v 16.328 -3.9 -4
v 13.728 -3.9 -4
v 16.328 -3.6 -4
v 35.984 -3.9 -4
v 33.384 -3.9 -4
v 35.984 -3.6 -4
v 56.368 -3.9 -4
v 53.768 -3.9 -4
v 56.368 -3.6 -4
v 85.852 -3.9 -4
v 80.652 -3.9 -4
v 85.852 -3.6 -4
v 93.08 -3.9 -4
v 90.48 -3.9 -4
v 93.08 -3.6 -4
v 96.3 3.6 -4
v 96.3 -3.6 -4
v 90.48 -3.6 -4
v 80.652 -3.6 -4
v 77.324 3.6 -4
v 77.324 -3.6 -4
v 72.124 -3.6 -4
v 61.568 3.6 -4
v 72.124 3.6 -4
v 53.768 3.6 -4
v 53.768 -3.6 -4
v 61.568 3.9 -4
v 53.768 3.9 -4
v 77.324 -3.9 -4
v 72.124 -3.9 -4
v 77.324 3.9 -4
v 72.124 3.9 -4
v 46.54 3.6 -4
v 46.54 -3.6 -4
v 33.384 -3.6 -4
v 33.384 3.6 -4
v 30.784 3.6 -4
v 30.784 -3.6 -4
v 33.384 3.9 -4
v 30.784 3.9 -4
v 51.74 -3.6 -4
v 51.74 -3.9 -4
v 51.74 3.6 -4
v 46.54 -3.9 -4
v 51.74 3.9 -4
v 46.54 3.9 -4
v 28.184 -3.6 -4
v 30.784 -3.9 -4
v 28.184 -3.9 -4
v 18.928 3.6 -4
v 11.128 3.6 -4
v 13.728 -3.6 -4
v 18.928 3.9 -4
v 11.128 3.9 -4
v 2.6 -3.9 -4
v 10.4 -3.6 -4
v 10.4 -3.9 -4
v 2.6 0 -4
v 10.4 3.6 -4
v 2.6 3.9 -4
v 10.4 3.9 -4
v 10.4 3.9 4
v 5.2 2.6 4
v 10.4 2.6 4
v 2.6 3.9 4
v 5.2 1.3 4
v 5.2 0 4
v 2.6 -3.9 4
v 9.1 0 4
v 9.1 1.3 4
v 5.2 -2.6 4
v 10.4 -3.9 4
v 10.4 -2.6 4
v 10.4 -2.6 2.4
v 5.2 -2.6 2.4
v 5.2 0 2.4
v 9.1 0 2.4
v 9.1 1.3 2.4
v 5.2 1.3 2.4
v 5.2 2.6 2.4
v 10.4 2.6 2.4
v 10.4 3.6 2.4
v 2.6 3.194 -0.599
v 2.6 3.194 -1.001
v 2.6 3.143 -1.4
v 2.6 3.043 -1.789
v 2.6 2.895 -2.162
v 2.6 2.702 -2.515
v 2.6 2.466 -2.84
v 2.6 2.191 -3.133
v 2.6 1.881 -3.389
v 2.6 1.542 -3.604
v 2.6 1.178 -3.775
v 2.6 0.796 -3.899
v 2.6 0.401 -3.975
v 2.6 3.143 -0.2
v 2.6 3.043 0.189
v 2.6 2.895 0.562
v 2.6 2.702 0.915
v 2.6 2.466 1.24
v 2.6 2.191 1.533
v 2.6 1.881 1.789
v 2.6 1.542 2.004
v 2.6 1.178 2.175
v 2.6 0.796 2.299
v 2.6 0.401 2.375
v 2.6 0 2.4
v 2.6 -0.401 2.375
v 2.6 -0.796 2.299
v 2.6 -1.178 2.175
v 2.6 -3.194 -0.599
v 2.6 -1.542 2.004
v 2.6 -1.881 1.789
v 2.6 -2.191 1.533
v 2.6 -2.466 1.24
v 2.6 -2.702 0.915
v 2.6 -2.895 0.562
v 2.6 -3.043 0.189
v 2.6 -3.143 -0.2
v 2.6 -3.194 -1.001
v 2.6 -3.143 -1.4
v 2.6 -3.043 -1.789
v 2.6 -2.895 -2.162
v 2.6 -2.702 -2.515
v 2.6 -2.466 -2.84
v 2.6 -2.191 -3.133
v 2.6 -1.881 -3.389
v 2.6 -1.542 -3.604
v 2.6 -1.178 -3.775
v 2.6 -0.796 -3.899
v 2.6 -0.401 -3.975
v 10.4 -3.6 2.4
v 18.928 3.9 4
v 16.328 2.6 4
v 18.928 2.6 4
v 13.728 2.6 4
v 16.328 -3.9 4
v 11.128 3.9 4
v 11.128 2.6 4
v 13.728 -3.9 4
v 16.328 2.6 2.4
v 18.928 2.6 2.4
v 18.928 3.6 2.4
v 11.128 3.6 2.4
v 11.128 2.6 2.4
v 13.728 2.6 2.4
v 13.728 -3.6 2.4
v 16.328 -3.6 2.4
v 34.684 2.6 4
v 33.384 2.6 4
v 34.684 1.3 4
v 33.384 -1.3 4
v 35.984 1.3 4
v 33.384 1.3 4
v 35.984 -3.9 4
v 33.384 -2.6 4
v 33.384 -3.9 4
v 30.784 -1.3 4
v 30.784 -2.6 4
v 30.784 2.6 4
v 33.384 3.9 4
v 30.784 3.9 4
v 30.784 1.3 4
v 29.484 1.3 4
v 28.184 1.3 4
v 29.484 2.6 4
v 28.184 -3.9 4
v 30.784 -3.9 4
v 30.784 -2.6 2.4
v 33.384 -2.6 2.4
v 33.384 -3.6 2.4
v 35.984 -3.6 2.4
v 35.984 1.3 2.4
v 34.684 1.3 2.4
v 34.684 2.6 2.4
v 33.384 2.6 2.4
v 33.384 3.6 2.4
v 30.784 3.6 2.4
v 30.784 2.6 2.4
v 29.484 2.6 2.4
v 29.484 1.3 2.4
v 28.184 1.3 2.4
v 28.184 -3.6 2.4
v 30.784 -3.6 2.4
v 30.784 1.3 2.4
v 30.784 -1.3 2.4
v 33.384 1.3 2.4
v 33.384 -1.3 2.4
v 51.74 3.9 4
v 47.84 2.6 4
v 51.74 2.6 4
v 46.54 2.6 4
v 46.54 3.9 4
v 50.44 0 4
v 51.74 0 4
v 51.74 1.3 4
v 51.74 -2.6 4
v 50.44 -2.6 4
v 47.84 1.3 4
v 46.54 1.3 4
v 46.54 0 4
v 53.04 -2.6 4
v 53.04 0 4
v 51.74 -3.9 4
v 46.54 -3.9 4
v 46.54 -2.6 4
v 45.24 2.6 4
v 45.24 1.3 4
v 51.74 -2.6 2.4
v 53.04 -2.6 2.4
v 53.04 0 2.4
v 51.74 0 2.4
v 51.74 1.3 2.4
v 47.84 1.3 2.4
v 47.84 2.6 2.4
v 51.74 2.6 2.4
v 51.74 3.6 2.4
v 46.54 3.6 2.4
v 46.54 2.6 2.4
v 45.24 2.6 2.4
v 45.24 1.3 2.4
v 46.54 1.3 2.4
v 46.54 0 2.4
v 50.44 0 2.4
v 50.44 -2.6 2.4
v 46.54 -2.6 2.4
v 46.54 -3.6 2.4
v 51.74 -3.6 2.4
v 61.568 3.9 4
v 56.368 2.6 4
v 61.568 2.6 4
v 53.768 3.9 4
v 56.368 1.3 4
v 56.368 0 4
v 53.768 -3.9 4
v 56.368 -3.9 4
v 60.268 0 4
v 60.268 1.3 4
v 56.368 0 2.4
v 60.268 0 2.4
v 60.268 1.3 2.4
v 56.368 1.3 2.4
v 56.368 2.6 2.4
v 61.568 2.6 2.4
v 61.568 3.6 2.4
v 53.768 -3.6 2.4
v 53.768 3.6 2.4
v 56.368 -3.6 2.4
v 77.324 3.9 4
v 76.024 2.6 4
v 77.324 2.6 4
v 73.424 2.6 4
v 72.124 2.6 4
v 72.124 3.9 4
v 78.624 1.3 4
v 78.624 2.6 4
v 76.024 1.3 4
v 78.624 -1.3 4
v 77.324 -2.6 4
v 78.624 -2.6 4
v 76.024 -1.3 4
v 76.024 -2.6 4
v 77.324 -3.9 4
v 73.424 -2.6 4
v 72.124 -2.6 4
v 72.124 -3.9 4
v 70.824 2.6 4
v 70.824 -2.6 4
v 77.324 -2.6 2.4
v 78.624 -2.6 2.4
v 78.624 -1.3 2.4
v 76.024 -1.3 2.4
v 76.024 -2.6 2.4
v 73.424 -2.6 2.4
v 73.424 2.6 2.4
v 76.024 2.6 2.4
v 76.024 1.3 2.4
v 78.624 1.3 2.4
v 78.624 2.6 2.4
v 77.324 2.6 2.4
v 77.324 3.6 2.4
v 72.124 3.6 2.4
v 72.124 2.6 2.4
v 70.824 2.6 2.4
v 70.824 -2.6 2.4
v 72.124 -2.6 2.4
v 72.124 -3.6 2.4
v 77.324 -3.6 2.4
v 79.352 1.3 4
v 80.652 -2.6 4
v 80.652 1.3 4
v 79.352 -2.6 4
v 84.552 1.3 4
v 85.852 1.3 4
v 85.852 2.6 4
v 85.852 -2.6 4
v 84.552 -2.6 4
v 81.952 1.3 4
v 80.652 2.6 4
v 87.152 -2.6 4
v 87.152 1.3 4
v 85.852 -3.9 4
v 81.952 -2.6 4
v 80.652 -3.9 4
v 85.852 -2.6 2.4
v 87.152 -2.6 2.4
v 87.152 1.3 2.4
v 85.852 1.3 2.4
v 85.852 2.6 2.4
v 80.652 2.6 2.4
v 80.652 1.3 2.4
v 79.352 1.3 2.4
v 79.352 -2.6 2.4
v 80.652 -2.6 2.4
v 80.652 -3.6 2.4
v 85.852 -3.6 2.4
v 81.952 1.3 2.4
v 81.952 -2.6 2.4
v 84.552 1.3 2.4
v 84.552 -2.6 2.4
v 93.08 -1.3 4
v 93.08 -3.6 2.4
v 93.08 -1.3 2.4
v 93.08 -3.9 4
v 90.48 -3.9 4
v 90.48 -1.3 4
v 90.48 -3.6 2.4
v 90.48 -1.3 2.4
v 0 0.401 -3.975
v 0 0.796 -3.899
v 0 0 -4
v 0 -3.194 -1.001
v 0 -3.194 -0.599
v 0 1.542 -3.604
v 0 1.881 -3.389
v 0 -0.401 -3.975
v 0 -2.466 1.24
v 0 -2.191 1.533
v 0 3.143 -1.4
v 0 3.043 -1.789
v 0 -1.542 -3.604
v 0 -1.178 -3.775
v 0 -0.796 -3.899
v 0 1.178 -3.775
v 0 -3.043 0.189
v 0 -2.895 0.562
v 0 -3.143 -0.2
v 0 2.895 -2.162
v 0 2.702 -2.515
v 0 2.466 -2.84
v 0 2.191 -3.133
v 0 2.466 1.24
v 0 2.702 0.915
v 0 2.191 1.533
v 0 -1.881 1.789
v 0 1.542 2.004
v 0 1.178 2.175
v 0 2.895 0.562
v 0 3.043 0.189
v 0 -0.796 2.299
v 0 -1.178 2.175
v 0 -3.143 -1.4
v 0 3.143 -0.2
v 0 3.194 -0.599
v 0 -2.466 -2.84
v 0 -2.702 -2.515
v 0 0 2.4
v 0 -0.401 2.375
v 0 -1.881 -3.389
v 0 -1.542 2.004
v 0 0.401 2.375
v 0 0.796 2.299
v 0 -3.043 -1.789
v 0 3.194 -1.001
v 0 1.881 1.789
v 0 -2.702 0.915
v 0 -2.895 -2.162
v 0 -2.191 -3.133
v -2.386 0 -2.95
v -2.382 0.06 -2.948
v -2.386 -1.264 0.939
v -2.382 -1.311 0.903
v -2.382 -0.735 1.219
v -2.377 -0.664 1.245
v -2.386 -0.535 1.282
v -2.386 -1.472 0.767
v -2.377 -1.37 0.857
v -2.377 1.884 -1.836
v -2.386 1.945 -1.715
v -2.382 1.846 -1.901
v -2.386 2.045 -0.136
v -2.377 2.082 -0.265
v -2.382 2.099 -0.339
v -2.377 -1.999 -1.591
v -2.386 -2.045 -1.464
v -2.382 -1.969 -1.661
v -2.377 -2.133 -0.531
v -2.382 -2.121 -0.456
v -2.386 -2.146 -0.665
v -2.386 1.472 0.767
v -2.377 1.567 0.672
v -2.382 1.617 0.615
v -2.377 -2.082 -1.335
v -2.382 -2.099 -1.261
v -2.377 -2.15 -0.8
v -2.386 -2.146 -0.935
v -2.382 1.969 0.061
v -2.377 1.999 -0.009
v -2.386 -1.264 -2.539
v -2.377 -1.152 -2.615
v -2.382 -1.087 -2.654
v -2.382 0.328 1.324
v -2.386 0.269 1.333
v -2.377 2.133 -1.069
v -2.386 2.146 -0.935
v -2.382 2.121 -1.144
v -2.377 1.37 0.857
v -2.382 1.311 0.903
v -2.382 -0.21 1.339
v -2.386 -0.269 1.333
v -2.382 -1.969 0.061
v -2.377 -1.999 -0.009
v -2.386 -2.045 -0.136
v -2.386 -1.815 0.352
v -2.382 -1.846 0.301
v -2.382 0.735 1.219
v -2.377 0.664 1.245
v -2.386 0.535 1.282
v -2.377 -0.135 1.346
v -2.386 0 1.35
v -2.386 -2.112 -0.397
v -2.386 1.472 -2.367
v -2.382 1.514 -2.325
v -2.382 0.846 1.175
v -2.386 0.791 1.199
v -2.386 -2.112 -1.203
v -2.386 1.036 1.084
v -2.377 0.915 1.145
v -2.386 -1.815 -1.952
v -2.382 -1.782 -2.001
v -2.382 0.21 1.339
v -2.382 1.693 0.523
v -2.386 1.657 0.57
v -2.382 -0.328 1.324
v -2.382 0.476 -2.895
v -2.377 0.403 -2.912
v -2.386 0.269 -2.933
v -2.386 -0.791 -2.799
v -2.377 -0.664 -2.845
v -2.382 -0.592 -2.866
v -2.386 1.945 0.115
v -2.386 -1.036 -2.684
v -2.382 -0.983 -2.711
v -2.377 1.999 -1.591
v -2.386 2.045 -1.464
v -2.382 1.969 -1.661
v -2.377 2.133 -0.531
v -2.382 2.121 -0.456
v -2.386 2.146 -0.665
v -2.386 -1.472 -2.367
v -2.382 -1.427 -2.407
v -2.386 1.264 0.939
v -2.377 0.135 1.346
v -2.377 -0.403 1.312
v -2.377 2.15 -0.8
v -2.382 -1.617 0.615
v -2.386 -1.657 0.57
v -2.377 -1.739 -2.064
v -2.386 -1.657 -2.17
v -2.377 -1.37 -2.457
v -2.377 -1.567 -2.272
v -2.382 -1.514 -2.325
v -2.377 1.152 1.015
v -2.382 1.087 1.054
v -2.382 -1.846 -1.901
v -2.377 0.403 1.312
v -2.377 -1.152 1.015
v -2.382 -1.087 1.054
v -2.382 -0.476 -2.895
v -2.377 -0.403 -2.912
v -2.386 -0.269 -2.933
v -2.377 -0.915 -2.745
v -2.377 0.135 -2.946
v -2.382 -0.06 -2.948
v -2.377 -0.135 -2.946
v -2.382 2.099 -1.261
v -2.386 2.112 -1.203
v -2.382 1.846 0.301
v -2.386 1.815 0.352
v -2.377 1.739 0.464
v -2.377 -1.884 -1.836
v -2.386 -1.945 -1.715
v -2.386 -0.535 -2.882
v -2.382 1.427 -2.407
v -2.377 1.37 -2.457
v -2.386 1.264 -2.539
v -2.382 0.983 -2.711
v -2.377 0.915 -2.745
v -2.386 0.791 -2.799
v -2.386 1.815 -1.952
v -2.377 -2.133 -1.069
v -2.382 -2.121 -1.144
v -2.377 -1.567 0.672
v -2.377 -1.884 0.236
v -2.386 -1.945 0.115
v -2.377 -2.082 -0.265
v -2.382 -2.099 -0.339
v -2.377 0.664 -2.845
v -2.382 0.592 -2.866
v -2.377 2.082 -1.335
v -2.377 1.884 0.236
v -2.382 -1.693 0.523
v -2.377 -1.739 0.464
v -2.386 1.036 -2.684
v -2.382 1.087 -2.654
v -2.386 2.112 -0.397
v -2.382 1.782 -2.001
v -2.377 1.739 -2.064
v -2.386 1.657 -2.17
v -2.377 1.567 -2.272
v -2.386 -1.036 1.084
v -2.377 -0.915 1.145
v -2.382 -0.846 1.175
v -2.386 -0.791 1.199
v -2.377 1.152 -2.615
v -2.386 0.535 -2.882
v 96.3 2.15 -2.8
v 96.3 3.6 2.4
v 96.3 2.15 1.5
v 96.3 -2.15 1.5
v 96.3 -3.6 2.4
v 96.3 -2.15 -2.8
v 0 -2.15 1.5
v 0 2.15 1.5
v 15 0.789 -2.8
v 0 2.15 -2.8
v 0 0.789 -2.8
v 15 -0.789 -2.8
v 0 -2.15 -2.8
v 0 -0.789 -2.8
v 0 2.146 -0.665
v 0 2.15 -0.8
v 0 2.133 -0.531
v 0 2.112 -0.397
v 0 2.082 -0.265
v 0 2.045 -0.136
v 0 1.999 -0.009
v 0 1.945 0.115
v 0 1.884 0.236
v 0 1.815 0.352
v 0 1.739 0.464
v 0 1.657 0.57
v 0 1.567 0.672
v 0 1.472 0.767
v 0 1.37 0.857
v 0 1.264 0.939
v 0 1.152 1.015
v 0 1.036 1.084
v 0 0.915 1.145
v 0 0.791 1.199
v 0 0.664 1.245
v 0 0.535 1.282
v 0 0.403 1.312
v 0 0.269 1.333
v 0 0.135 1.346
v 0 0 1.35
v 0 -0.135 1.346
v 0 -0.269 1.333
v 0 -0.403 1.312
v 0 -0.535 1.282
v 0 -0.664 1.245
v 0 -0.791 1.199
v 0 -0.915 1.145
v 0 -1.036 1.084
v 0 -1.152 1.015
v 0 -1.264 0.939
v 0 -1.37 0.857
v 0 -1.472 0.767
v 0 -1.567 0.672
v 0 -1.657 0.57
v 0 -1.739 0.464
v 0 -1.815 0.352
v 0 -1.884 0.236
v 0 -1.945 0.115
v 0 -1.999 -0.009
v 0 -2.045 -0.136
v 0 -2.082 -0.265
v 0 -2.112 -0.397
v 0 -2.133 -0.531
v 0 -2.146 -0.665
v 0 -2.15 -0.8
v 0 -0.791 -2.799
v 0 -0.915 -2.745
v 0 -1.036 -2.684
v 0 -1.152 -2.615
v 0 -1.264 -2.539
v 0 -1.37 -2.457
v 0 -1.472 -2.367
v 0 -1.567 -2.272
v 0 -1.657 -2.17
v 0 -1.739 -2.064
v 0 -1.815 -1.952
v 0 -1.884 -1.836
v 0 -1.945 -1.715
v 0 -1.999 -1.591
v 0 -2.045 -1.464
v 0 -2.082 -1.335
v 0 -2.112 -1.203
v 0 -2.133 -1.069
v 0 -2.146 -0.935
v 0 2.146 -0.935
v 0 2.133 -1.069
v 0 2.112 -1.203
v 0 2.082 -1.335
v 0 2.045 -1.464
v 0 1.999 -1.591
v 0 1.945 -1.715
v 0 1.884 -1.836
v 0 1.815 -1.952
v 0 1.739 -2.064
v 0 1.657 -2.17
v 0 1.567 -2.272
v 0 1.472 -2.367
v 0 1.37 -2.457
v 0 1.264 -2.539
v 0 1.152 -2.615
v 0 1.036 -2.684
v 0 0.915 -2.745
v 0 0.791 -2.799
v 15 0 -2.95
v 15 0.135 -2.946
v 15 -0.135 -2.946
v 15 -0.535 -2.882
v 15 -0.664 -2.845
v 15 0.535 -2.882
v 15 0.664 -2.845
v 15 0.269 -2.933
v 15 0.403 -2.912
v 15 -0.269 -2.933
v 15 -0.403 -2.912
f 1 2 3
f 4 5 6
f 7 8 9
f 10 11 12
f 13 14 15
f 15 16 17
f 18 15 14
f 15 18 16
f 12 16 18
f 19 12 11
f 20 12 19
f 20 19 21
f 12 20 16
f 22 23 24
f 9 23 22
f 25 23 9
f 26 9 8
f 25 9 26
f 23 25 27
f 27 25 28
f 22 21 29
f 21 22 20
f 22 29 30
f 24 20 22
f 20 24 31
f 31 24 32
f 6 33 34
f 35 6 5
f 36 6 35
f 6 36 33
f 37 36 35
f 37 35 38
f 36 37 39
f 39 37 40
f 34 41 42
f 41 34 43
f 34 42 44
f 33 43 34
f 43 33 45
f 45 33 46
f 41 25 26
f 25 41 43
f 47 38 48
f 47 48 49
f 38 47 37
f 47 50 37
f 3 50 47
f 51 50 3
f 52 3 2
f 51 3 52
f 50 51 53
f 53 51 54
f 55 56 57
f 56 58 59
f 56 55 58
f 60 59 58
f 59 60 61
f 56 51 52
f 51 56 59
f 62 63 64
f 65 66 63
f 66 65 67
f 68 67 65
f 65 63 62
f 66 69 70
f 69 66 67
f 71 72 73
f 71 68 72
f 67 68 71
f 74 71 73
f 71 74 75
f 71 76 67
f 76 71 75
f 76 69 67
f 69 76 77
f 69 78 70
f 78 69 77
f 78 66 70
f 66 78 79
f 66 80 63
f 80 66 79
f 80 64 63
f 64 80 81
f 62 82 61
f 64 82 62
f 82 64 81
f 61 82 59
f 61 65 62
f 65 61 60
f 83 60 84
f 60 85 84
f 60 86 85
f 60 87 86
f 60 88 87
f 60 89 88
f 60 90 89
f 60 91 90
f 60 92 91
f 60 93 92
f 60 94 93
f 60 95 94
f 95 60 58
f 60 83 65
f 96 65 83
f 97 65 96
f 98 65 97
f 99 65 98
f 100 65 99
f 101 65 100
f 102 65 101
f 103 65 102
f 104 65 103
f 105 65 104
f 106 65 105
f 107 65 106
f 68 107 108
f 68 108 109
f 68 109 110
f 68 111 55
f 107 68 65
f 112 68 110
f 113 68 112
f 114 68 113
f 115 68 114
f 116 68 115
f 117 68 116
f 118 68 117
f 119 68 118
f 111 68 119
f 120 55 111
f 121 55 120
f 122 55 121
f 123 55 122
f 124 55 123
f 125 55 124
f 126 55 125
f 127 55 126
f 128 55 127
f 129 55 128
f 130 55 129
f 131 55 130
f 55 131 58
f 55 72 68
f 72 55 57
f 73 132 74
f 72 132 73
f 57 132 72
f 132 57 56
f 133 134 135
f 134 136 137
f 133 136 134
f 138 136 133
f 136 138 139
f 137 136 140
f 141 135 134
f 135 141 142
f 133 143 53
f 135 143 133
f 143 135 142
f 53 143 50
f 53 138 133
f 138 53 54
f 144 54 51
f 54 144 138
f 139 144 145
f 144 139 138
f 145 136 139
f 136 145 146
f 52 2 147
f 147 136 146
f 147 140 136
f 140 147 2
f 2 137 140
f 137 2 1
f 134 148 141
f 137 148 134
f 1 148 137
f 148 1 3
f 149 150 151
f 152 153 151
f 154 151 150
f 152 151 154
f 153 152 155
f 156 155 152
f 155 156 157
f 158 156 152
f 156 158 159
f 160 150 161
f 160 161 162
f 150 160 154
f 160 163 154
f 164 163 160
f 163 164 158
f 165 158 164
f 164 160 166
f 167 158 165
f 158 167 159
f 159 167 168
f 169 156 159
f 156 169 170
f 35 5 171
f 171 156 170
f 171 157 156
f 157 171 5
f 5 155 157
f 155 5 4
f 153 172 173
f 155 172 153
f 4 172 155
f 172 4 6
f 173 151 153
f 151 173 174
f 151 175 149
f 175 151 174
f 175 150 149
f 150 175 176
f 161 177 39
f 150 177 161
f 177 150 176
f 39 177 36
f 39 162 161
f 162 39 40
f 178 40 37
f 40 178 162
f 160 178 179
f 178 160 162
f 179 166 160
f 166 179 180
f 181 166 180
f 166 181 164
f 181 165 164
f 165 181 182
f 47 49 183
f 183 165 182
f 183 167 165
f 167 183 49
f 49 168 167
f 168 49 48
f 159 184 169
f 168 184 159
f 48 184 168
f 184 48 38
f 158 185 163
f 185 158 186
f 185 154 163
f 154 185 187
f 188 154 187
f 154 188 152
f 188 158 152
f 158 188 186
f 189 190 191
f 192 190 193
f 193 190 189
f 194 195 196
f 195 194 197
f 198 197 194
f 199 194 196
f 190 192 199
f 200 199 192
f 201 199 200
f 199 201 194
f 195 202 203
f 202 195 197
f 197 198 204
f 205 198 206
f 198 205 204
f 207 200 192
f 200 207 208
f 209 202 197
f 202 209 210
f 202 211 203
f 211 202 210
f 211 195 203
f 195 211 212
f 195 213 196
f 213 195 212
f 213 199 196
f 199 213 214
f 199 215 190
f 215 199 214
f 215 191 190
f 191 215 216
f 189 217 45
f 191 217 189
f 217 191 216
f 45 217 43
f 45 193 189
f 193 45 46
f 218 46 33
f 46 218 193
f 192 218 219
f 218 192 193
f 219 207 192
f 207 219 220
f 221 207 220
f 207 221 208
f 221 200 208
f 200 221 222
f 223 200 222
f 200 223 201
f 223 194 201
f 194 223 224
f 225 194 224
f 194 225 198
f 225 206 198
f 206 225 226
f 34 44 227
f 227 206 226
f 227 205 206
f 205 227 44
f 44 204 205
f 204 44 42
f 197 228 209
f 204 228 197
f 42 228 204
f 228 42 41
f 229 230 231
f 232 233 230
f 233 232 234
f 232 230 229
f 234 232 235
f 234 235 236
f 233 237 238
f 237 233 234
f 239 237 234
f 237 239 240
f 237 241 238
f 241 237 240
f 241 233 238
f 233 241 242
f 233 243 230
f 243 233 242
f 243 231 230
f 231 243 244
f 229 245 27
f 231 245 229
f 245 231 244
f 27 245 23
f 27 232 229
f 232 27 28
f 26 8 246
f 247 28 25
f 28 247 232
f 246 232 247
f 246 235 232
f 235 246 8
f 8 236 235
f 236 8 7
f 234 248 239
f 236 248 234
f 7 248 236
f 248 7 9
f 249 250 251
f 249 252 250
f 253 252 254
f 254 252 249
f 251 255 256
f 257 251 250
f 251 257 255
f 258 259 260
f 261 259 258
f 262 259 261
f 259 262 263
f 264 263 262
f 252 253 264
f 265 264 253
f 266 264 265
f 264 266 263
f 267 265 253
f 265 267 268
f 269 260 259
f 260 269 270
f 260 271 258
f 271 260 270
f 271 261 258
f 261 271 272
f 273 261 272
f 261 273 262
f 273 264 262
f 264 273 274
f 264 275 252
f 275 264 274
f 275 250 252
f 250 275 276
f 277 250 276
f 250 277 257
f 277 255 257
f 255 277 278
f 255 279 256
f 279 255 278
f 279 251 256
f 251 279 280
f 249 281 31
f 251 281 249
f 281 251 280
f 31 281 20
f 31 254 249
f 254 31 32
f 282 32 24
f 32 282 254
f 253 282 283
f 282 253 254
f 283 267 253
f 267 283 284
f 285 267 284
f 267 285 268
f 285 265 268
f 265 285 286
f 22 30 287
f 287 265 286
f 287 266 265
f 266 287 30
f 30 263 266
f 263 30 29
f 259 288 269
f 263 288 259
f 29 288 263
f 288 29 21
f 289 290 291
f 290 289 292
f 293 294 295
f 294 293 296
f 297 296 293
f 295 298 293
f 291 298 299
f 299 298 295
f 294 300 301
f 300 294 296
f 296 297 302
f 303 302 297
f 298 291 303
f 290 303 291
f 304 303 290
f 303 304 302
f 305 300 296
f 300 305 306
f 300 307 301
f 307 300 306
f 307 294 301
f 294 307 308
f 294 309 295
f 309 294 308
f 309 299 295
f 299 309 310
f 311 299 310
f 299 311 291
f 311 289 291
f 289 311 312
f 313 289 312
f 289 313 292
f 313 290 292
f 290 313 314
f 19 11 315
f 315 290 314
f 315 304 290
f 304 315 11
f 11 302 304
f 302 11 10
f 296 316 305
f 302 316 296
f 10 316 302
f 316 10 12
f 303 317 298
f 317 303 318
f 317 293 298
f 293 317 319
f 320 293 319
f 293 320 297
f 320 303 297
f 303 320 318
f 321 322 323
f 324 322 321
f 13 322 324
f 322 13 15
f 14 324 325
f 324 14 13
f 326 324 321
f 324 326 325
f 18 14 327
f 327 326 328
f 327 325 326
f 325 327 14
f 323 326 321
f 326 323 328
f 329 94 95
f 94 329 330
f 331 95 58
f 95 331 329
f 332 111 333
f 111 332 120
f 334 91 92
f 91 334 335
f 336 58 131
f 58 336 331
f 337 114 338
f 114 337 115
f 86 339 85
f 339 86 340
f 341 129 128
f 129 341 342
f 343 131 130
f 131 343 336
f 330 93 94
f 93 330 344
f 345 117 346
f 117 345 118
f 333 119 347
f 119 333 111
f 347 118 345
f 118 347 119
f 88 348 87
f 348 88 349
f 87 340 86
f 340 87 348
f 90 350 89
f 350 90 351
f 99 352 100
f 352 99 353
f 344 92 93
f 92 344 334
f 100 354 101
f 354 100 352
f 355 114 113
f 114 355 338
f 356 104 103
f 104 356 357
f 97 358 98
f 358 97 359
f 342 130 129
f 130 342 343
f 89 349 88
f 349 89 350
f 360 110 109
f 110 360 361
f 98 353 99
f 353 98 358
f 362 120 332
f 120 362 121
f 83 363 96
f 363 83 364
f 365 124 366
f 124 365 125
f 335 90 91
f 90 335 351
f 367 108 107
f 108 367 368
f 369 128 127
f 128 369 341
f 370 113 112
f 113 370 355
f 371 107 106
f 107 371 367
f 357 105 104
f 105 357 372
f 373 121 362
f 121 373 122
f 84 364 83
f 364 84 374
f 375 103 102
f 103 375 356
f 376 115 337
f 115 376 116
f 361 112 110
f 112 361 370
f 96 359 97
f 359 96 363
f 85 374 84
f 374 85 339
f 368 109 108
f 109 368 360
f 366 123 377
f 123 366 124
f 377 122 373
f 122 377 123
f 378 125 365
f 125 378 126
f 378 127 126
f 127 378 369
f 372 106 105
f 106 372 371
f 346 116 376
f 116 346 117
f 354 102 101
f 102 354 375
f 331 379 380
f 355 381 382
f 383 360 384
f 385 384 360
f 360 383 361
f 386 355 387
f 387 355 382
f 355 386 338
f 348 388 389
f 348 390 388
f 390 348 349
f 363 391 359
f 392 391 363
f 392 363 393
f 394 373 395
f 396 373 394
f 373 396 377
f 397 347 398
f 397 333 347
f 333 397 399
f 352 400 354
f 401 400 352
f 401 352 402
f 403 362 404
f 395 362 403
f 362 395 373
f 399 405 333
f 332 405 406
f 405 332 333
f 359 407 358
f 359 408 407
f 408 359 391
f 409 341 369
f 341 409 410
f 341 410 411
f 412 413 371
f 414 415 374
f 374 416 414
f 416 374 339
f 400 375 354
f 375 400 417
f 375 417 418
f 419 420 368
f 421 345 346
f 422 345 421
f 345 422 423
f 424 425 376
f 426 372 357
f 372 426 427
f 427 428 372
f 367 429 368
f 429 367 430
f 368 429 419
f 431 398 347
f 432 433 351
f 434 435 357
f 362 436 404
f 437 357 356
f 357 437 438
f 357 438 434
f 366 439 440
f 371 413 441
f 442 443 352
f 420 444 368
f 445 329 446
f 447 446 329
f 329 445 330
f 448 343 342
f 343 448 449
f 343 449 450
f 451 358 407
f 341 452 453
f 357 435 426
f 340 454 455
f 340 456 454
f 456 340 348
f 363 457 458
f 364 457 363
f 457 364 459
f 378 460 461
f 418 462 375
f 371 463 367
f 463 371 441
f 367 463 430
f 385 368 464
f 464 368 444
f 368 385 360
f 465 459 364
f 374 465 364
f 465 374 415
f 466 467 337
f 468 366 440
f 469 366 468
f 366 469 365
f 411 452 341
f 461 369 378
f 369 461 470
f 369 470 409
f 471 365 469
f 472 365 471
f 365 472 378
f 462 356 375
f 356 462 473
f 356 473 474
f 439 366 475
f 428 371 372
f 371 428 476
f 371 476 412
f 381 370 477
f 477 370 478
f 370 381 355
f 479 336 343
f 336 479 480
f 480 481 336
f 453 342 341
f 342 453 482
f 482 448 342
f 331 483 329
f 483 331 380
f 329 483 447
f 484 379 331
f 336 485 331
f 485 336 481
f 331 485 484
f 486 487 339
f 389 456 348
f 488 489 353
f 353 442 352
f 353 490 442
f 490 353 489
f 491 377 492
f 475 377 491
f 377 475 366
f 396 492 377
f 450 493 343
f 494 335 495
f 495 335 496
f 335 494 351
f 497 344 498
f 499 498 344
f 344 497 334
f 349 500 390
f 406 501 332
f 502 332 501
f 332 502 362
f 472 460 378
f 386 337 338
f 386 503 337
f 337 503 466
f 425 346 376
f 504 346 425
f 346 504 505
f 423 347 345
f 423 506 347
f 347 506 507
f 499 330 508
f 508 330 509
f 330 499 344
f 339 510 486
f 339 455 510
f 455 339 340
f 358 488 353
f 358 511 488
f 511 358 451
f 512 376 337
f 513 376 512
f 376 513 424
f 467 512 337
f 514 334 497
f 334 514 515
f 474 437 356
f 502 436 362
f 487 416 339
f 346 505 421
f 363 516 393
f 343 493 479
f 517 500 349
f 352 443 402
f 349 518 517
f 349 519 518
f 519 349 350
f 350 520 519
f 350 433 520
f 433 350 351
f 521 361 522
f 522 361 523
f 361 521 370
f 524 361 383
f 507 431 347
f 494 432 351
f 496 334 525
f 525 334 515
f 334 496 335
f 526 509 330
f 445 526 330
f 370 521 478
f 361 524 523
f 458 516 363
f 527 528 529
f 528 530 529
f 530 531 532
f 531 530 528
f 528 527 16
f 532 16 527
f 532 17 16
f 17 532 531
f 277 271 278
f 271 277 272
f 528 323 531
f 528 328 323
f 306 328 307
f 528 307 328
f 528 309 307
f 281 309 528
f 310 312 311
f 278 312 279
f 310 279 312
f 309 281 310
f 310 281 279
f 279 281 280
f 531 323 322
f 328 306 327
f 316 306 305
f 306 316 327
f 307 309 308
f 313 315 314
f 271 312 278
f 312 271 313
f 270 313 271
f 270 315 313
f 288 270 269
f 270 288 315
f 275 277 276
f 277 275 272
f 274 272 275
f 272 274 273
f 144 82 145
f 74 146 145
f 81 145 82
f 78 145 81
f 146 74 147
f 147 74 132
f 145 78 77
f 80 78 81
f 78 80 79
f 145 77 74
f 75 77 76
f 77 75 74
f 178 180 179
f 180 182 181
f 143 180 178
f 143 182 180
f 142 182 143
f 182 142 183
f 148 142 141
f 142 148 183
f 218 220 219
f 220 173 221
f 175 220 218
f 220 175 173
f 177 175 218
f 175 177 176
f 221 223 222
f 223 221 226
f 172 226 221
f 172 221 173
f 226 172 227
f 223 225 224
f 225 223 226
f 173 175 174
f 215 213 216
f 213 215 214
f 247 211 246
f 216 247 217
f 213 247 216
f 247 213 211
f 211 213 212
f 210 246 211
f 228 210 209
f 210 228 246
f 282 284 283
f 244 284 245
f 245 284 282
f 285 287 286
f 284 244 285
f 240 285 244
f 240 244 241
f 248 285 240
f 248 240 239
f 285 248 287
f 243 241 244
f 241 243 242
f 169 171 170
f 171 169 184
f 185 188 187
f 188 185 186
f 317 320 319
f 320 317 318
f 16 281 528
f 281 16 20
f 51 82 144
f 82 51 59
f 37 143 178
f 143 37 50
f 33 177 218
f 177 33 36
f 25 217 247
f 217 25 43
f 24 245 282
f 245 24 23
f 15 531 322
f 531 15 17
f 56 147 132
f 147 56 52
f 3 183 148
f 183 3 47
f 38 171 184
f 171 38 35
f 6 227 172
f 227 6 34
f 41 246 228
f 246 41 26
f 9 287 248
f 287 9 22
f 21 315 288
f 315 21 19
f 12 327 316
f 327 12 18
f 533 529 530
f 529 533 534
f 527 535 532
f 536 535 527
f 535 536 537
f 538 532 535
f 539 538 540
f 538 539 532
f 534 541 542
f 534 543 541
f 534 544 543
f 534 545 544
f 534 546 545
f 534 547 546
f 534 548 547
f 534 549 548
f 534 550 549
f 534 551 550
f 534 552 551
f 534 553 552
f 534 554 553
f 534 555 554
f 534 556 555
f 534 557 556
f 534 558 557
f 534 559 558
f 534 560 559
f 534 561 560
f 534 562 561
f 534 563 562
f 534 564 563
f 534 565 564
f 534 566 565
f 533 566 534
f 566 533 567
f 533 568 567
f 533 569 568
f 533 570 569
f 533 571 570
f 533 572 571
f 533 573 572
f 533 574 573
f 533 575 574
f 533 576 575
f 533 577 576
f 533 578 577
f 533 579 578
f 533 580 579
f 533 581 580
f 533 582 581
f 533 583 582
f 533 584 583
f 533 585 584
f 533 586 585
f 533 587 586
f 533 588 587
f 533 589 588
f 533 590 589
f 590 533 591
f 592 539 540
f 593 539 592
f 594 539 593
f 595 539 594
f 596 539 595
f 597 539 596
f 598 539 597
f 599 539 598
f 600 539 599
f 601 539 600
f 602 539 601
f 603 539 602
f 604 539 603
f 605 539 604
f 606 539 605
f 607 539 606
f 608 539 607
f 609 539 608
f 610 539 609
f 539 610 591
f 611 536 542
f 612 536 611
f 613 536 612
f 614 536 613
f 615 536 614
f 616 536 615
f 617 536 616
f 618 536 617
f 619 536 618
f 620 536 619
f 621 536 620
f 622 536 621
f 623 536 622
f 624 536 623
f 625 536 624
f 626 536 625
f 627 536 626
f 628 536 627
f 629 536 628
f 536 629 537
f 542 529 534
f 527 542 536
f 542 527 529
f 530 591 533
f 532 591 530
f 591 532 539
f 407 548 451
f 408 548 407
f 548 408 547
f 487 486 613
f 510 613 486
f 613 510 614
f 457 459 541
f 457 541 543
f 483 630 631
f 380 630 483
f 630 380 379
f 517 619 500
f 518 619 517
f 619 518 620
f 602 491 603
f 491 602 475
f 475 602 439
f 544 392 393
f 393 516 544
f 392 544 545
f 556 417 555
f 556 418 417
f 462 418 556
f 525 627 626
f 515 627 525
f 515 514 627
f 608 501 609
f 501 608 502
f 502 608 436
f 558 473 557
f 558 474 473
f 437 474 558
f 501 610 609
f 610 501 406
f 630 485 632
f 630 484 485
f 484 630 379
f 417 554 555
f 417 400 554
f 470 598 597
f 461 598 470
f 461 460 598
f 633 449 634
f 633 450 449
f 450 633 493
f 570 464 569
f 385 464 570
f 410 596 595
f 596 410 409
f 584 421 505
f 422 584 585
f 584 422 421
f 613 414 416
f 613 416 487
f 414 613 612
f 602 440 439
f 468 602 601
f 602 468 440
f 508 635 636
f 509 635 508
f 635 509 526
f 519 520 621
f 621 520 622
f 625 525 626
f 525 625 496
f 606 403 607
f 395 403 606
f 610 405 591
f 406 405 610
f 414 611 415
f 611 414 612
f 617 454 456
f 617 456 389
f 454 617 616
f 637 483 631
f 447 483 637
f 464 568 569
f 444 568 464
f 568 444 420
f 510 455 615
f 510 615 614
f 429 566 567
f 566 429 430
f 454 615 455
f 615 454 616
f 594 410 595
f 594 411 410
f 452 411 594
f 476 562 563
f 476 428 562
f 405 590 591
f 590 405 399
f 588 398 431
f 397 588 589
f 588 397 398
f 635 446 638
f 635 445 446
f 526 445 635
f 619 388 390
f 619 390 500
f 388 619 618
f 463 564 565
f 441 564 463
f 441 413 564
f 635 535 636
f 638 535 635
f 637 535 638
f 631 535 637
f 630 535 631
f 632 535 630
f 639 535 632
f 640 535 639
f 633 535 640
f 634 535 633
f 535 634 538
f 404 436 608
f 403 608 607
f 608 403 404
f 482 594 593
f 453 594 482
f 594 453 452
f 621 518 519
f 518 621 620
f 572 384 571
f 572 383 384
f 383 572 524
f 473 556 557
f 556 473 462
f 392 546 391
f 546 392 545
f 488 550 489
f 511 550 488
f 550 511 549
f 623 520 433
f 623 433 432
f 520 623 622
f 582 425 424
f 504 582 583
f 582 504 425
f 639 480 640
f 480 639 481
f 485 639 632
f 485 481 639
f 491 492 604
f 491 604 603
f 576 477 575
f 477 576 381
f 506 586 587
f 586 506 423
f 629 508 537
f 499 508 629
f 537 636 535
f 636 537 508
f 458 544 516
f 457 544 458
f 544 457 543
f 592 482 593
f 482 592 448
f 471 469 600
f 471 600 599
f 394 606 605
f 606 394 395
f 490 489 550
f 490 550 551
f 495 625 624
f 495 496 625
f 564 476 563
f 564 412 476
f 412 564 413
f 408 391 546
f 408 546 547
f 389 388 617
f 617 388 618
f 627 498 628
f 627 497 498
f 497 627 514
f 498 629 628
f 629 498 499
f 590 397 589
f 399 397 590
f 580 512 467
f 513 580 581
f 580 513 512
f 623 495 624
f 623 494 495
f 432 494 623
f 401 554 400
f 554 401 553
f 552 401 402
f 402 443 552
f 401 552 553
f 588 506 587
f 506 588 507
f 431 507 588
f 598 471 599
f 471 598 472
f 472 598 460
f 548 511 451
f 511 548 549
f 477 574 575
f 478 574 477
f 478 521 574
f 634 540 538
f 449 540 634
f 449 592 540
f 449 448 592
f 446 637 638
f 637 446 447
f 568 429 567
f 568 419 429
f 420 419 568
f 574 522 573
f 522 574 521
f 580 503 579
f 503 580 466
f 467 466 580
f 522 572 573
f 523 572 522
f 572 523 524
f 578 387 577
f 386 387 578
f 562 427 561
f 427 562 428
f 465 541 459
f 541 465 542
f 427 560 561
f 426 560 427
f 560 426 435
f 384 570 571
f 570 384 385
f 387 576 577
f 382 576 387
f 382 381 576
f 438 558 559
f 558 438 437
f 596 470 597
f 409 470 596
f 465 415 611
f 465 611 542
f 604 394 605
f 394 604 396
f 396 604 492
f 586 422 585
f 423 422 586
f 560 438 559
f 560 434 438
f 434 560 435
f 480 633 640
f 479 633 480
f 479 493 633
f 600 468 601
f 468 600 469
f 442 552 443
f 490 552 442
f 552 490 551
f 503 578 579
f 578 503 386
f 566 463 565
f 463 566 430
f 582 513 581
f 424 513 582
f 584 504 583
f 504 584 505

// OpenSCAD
use <MCAD/fonts.scad>

// Word to display on the pen
word = "ET A SF Co.";

// Scale multipler for font size
font_scale = 1.3	;

// Character Spacing (for some reason this value is buggy using the customizer)
font_spacing = 0.82; 

// The diameter of end hole
pen_inner_diameter = 4.3 *1;
pen_inner_radius = pen_inner_diameter / 2;

// length of the entire pen
pen_length = 95; //

// Overal thickness of the pen
pen_thickness = 8*1;


/////////////////////////////////////////
//////////////////////////////////



module penword()
{

thisFont=8bit_polyfont();
x_shift=thisFont[0][0] * font_spacing;
y_shift=thisFont[0][1];

	theseIndicies=search(word,thisFont[2],1,1);
	wordlength = (len(theseIndicies))* x_shift;
	
	difference() {

		union() {

// Create the Text //
			scale([font_scale,font_scale,1]){
			for( j=[0:(len(theseIndicies)-1)] ) 
				translate([ j*x_shift + 1, -y_shift/2 ,-pen_thickness/2]) 
				{
					linear_extrude(height=pen_thickness) polygon(points=thisFont[2][theseIndicies[j]][6][0],paths=thisFont[2][theseIndicies[j]][6][1]);
				}
			}
			
// Main body
			translate([1*font_scale+3	,-y_shift*.45,-pen_thickness/2]) cube([pen_length - 3,y_shift * 0.9,pen_thickness * 0.8]);

// Pen Tip
			rotate(a=[0,90,0]) 
				{
					translate([pen_thickness*0.1,0,0	])	cylinder(h = 5, r = pen_thickness*.4, $fn=50);
					translate([pen_thickness*0.1,0,-5	])	cylinder(h = 5, r1 = 1, r2 = pen_thickness*.4, $fn=50);
				}			
		}
// Cut outs
			translate([0,-pen_inner_diameter/2,-pen_thickness/2+pen_thickness*.15]) cube([pen_length + 20,pen_inner_diameter,pen_inner_diameter]);
			rotate(a=[0,90,0])translate([pen_thickness*.1,0,-15])	cylinder(h = 30, r = pen_inner_radius, $fn=100);
	}
}




penword();
